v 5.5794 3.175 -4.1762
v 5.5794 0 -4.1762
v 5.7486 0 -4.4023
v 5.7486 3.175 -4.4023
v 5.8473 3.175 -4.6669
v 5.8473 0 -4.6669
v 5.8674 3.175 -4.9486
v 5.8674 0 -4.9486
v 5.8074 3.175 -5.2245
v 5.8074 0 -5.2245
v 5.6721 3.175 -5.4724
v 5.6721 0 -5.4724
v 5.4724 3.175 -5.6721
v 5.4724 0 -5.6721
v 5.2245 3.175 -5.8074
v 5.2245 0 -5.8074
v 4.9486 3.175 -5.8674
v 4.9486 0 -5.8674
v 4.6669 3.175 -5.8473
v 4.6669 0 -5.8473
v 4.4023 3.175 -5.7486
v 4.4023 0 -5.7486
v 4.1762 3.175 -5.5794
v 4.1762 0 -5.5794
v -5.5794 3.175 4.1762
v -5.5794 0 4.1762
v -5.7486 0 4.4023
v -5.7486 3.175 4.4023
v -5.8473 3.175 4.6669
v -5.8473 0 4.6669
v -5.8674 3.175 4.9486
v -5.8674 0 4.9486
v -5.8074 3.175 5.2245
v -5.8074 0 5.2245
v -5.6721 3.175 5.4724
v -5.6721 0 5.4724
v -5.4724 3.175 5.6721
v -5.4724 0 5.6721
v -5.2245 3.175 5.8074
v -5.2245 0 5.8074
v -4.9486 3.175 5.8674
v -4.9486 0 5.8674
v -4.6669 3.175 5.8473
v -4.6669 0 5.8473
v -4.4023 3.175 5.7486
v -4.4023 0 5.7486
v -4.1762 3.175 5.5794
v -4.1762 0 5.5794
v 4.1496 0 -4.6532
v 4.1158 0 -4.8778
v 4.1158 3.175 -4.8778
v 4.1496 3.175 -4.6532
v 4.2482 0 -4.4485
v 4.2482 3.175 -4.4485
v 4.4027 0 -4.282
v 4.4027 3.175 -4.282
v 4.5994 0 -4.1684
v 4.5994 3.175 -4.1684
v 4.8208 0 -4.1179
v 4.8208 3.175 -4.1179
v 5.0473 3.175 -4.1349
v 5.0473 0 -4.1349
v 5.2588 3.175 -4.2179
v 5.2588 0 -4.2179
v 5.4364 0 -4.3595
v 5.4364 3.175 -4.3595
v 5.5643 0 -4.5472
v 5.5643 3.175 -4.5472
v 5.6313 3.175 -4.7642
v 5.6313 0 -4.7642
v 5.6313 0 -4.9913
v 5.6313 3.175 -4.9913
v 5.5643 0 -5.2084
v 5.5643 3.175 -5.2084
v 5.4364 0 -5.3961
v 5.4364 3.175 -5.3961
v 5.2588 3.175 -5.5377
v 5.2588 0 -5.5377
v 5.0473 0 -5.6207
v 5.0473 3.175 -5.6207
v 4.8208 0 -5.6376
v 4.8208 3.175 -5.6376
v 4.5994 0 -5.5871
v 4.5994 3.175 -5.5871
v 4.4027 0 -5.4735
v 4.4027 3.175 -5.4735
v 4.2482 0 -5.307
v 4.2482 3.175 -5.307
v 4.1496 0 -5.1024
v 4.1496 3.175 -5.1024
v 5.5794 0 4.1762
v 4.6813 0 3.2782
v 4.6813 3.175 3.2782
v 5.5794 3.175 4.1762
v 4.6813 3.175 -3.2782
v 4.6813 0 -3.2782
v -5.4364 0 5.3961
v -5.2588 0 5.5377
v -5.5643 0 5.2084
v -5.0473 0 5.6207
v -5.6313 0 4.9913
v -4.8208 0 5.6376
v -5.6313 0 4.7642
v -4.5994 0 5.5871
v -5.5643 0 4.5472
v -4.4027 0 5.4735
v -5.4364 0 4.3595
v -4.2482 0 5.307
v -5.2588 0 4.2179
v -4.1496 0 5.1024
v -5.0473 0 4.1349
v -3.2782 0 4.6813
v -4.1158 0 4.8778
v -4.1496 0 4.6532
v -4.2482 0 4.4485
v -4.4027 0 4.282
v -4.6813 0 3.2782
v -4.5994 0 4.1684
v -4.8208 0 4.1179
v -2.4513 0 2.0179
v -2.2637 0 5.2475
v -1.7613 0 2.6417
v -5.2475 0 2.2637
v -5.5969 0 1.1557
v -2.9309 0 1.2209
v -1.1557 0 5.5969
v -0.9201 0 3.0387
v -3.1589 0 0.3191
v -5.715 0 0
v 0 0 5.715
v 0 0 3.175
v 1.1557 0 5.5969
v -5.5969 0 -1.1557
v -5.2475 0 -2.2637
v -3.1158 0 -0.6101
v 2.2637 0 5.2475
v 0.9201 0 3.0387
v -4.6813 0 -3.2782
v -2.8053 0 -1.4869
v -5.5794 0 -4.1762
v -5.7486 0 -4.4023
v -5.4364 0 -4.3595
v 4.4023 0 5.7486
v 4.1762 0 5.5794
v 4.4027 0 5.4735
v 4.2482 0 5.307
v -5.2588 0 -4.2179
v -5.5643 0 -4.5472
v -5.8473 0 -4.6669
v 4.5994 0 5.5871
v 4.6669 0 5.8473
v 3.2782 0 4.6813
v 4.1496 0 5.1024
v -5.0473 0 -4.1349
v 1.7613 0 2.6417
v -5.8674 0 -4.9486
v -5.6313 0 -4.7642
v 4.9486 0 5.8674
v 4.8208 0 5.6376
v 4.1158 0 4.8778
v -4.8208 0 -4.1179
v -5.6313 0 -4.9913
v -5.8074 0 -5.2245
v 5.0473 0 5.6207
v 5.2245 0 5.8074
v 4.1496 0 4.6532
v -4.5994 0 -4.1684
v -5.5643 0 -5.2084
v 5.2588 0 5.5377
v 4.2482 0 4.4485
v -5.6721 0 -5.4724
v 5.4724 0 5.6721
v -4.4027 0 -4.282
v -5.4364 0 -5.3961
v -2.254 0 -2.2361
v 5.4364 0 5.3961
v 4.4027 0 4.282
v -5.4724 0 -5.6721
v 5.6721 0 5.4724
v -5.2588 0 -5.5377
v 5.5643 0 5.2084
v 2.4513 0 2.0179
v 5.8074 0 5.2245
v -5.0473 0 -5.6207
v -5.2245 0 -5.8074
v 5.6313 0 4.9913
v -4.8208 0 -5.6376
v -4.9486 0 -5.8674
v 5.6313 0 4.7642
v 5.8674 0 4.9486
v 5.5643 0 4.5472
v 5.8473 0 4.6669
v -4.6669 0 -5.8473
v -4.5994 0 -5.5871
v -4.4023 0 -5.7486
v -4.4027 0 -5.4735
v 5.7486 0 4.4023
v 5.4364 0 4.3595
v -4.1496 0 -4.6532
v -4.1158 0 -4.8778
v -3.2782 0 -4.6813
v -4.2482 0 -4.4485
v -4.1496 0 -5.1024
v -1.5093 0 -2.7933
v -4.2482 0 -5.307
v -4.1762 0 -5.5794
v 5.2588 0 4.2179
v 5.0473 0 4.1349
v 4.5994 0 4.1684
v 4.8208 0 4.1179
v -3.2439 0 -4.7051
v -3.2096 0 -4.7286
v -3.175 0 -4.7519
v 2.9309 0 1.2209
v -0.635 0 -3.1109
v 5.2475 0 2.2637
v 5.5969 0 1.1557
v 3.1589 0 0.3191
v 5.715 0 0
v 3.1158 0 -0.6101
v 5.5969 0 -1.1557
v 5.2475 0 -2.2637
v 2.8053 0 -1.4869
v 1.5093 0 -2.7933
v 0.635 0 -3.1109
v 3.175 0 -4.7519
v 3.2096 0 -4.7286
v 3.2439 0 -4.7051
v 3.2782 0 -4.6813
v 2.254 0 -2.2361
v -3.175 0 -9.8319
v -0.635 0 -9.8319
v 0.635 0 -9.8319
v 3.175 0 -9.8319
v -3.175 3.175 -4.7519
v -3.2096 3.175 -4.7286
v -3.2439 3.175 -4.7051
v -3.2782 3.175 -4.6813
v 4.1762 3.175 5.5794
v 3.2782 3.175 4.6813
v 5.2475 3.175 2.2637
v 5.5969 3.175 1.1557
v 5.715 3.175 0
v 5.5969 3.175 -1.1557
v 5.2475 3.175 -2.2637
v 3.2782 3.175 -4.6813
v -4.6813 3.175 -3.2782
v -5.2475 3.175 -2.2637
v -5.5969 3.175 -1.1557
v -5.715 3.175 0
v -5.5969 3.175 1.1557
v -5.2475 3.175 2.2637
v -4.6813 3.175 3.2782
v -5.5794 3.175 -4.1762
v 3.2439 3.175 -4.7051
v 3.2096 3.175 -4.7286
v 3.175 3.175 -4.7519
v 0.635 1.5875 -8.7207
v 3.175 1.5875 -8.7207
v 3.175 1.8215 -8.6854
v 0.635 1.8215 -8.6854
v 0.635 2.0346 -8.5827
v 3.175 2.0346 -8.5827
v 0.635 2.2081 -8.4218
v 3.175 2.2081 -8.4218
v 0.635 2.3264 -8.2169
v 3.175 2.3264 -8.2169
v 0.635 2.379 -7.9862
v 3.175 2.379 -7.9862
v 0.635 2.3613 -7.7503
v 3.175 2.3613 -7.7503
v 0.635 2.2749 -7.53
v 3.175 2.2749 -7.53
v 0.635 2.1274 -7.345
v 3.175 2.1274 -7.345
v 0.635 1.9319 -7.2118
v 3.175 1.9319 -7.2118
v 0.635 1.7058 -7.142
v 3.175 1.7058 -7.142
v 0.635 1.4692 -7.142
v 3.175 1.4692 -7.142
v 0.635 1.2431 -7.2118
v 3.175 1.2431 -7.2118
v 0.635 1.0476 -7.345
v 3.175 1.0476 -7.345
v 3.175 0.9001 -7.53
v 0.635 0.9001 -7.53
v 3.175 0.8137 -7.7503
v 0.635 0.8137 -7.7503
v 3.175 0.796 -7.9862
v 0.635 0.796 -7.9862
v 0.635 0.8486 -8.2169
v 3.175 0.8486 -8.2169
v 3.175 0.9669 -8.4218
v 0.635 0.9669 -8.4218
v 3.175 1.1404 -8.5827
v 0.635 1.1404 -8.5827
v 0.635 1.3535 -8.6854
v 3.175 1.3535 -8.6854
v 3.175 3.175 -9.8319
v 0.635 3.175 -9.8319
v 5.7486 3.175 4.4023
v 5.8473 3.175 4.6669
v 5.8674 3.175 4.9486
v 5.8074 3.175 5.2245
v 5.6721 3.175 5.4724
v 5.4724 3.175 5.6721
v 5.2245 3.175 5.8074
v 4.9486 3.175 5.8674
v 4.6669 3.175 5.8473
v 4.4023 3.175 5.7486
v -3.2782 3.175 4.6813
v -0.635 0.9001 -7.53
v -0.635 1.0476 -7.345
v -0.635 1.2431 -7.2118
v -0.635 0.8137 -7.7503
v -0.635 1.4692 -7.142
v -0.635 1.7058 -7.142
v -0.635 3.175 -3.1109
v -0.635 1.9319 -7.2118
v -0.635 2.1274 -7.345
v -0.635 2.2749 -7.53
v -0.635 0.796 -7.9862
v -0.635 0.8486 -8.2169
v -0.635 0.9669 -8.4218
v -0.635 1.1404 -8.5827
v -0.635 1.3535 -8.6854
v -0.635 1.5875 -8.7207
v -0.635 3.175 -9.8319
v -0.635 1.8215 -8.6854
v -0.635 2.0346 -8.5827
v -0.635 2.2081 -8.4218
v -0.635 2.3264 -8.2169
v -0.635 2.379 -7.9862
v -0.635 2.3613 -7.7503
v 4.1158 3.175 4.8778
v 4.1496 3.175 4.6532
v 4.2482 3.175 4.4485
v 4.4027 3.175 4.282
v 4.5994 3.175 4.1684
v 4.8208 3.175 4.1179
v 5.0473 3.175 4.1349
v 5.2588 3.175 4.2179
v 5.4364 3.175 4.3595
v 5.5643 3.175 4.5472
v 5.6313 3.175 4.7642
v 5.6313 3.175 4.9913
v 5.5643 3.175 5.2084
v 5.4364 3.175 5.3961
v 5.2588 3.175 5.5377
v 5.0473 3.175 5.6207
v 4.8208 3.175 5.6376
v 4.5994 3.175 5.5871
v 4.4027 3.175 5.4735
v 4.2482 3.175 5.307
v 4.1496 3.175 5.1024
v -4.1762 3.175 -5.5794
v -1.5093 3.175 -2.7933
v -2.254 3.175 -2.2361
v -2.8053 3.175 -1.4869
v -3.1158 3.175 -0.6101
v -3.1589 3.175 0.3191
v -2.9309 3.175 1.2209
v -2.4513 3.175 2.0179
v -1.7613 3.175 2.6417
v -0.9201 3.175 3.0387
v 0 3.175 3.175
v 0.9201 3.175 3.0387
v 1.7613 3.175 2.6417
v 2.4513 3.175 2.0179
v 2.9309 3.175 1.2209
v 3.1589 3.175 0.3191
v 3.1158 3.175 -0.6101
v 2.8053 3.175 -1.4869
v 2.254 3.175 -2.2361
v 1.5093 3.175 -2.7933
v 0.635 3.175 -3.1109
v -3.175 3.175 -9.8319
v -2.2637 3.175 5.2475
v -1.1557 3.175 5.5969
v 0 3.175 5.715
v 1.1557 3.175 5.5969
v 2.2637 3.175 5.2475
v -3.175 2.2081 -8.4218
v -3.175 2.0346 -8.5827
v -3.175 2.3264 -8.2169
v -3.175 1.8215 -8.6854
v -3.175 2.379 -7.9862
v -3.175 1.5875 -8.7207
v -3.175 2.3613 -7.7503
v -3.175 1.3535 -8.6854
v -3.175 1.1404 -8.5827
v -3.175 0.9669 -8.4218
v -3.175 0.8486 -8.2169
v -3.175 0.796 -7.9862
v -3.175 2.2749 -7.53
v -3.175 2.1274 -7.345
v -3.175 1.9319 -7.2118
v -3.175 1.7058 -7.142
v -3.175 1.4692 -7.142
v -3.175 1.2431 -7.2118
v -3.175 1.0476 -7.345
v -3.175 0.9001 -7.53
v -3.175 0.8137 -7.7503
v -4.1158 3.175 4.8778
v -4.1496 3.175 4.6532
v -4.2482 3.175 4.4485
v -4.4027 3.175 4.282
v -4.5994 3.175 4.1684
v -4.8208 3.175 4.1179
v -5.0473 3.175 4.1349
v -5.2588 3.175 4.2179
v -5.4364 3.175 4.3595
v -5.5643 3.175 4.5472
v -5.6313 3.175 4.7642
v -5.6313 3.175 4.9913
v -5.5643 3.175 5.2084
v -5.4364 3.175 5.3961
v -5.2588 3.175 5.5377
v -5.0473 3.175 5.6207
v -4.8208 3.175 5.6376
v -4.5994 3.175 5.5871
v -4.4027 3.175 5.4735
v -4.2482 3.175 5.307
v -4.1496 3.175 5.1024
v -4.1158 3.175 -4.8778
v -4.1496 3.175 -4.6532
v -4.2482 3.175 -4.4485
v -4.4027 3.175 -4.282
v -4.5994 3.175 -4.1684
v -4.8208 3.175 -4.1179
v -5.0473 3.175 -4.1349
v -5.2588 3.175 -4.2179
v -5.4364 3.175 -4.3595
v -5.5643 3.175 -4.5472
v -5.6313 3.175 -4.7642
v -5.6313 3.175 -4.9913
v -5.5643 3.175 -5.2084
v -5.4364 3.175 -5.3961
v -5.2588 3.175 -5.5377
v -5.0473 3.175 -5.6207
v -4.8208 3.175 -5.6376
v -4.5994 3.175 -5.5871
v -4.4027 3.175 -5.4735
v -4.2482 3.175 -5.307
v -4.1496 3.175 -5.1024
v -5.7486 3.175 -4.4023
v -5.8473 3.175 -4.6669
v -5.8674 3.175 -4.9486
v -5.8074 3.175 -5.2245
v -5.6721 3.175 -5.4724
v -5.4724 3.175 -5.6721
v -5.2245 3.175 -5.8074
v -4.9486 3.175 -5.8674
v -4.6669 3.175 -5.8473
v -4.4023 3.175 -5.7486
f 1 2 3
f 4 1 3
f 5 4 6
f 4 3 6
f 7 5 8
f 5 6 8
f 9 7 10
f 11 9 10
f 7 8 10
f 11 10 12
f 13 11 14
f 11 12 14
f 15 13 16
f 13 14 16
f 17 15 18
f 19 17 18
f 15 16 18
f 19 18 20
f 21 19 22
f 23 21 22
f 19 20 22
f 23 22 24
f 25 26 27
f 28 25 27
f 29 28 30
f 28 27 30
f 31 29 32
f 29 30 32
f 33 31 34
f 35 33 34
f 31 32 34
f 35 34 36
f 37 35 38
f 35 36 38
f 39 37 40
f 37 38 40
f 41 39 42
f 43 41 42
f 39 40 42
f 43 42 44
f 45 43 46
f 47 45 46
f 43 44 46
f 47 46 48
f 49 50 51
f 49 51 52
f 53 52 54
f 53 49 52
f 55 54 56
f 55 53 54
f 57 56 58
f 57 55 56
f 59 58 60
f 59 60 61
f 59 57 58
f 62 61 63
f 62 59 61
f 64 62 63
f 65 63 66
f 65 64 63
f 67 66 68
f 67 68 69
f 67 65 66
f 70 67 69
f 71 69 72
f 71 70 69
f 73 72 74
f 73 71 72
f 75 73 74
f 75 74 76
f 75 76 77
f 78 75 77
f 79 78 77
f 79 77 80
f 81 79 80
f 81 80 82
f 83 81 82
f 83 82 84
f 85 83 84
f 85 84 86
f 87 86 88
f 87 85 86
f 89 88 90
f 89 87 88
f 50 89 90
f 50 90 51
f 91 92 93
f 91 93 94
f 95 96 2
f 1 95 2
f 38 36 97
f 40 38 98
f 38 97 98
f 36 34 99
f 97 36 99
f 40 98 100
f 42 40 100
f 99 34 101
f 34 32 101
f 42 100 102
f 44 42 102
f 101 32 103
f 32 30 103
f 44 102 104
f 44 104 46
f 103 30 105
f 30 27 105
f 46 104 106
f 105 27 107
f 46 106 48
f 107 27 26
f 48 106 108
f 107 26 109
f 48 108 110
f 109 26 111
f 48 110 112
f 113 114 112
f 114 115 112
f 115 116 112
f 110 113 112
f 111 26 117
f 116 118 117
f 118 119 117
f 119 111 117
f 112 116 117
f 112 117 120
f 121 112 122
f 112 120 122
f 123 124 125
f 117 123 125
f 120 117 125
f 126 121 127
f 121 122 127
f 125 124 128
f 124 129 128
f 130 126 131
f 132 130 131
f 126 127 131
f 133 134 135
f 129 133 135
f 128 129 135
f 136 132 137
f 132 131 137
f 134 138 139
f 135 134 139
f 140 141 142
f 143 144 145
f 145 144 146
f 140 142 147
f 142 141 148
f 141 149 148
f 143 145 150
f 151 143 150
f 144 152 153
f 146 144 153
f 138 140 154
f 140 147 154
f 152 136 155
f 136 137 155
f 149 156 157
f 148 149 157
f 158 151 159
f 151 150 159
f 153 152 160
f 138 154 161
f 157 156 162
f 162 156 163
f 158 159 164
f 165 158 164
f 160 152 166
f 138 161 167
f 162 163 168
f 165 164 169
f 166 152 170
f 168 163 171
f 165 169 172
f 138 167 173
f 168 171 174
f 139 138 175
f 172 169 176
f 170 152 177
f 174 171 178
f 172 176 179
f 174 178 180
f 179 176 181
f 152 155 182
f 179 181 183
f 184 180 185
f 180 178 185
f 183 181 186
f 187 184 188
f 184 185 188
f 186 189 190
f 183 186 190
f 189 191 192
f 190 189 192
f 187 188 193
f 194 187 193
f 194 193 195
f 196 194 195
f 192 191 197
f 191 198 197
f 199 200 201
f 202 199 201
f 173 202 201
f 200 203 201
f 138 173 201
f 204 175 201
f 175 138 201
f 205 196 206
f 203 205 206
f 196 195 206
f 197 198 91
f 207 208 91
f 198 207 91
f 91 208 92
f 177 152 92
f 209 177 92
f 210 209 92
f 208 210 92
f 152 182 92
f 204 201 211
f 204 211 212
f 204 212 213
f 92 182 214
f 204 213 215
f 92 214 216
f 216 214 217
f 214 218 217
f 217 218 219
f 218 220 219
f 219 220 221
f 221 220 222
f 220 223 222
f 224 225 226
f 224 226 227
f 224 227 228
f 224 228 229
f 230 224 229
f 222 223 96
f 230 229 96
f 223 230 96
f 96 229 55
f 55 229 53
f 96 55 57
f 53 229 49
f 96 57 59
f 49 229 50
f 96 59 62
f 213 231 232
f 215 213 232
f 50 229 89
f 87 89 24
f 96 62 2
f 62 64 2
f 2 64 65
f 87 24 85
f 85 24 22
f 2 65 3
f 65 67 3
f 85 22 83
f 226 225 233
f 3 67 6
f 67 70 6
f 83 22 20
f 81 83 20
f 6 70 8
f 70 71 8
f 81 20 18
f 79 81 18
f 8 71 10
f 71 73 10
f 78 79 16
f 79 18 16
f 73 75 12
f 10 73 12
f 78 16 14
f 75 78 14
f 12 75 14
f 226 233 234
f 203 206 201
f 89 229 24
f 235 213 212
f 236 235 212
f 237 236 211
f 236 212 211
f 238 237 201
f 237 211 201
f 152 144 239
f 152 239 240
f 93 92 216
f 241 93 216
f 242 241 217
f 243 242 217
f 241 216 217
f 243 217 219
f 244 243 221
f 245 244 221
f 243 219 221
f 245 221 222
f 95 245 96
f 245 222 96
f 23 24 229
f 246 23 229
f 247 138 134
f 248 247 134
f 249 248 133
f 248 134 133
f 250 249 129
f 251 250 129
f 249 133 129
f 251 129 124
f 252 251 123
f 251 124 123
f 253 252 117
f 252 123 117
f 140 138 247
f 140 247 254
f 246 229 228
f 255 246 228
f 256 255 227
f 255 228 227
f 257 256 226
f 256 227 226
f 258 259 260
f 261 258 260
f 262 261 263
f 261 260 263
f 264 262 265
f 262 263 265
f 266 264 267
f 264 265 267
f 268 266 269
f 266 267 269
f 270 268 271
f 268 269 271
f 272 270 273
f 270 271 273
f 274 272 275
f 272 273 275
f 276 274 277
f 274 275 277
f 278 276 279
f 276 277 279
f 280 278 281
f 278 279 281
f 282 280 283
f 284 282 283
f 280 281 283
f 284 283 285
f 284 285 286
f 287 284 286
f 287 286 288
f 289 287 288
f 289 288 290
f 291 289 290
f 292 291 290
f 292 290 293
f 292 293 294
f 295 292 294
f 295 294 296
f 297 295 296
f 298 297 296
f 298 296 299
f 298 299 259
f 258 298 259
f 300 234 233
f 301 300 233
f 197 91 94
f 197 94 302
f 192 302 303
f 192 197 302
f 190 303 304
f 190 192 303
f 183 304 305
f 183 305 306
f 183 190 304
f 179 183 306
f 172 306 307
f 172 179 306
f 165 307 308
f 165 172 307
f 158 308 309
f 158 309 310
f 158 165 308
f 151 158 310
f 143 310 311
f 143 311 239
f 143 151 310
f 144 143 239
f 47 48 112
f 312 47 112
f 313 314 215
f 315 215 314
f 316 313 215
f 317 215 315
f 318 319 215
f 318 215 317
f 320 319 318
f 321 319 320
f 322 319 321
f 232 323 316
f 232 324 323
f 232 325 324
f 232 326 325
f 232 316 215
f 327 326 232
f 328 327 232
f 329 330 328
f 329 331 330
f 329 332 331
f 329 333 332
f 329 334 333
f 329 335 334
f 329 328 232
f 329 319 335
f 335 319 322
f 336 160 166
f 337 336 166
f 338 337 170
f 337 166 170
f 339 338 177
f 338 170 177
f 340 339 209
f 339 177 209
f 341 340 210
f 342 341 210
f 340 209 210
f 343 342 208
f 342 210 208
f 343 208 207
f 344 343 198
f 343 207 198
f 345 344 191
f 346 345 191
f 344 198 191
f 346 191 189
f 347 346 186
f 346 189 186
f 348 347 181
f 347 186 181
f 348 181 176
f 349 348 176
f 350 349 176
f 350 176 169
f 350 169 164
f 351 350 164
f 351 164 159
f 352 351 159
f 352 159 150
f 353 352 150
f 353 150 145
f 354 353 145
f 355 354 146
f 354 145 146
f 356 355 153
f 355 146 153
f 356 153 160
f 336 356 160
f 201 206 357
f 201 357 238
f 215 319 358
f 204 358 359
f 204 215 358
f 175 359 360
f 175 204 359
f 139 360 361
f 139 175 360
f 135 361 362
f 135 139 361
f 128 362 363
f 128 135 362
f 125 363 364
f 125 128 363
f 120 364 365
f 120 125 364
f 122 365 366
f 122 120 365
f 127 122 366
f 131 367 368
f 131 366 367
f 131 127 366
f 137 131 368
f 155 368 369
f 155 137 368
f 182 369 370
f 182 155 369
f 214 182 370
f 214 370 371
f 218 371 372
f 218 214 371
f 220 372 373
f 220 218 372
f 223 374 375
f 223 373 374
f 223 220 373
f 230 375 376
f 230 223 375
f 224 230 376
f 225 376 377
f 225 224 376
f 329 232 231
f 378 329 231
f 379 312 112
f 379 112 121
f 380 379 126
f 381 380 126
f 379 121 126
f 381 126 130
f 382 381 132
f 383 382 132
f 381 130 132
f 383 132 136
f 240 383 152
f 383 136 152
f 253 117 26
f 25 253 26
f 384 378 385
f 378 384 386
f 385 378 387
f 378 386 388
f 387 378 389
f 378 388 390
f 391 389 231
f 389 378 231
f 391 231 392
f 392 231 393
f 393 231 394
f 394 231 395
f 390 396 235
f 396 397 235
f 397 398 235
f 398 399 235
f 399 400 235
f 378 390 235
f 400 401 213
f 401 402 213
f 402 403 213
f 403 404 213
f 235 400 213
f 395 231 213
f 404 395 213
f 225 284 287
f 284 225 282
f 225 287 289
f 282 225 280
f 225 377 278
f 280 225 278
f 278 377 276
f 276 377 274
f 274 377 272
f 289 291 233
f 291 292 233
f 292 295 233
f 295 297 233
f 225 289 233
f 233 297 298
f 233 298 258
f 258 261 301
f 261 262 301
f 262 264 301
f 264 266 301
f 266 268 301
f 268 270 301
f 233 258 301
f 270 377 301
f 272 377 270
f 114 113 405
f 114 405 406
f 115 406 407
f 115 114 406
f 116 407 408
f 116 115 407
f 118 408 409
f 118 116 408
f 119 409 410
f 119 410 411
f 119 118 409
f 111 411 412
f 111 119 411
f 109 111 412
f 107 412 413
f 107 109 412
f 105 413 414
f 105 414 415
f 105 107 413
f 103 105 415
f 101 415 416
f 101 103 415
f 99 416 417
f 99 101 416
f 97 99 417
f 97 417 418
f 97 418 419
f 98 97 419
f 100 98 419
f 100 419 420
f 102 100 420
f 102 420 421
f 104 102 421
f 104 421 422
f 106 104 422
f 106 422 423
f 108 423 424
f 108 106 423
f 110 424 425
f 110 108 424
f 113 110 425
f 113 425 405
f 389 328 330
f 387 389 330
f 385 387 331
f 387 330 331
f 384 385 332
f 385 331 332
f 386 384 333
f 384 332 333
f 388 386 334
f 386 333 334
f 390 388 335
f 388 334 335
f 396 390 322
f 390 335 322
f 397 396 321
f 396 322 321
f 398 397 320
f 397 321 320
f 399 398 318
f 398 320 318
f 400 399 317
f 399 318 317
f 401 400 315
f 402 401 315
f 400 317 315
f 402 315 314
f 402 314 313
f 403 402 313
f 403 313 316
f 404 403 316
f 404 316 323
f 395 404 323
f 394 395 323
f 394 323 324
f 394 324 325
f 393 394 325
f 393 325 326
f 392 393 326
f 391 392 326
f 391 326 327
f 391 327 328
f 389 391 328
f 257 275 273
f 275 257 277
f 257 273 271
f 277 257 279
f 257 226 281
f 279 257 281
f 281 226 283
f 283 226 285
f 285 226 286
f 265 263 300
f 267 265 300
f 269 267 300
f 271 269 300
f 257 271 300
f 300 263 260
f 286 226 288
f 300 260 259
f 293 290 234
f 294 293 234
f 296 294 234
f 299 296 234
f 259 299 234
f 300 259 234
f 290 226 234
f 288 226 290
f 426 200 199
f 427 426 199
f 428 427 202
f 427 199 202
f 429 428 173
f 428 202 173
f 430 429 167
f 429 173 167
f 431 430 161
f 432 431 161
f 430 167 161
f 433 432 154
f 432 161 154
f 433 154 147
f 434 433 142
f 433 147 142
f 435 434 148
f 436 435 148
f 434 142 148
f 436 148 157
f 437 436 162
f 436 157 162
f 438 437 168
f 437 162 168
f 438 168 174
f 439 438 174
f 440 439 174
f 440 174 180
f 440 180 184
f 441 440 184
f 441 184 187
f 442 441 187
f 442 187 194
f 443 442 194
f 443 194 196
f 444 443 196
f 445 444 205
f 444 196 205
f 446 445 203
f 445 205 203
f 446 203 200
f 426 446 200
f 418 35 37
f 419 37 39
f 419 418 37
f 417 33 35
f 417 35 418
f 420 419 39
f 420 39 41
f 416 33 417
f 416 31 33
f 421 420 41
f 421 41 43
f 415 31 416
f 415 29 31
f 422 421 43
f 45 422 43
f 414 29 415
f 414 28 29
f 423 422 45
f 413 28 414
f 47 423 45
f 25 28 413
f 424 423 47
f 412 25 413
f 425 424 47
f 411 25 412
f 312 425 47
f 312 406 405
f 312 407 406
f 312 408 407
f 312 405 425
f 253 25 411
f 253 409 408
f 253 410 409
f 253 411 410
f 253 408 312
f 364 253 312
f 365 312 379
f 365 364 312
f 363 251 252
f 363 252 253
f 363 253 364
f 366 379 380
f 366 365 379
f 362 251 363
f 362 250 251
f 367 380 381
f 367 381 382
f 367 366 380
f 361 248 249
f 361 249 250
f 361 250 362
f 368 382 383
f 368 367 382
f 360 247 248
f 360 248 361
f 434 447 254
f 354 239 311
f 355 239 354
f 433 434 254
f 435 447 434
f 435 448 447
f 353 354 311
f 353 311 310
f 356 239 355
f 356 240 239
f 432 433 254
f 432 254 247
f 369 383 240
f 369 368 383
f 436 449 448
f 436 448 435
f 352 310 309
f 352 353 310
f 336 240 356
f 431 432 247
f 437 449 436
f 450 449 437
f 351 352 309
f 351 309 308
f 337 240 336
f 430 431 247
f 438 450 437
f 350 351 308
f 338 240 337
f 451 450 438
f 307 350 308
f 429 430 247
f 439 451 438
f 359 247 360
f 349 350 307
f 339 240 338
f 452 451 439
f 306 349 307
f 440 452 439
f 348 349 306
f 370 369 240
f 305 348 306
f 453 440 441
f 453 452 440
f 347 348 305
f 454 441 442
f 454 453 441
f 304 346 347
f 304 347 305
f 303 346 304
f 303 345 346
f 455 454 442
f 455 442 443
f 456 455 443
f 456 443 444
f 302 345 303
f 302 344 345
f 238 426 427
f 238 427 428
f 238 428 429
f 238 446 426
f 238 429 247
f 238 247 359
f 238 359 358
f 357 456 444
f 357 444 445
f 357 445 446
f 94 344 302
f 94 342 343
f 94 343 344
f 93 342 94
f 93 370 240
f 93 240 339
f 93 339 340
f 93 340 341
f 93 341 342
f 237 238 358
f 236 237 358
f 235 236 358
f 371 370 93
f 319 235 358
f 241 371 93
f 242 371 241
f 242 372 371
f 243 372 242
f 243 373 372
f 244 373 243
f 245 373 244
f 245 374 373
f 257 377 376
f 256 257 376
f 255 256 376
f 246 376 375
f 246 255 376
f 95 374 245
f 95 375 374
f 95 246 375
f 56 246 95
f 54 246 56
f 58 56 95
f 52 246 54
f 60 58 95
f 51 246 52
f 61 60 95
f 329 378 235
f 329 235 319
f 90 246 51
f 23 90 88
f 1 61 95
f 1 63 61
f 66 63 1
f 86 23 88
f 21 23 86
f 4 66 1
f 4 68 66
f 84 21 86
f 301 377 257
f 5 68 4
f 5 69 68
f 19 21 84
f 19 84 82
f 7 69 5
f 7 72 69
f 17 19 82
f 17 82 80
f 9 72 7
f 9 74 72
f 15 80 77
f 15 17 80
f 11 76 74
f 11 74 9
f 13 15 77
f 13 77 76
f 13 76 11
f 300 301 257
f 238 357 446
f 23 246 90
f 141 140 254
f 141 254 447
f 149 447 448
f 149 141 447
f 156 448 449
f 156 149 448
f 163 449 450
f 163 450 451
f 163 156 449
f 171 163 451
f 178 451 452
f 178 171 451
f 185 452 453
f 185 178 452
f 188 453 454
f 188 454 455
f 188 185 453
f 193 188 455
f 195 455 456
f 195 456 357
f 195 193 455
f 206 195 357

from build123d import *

# Parameters (mm, degrees)
SKETCH1_R                                  = 3.175
BOSS_EXTRUDE1_DEPTH                        = 3.175
SKETCH3_W                                  = 1.27
SKETCH3_H                                  = 6.721052908
CUT_EXTRUDE1_DEPTH                         = 3.175
SKETCH4_R                                  = 0.79375
CUT_EXTRUDE2_DEPTH                         = 9.89
SKETCH5_R                                  = 0.762
BOSS_EXTRUDE2_DEPTH                        = 3.175
MIRROR1_AT_THE_SECOND_PLANE_COPY_1_SKETC_R = 0.762
MIRROR1_AT_THE_SECOND_PLANE_COPY_1_DEPTH   = 3.175


with BuildPart() as part:
    # Sketch1 → Boss-Extrude1 (new body)
    with BuildSketch(Plane(origin=(0, 0, 0), x_dir=(1, 0, 0), z_dir=(0, 1, 0))):
        with BuildLine():
            Line((3.175, 4.751904881), (3.175, 9.831904881))
            Line((3.175, 9.831904881), (-3.175, 9.831904881))
            Line((-3.175, 9.831904881), (-3.175, 4.751904881))
            ThreePointArc((-3.175, 4.751904881), (0, -5.715), (3.175, 4.751904881))
        make_face()
        Circle(SKETCH1_R, mode=Mode.SUBTRACT)
    extrude(amount=BOSS_EXTRUDE1_DEPTH)

    # Sketch3 → Cut-Extrude1 (cut)
    with BuildSketch(Plane(origin=(0, 3.175, 0), x_dir=(1, 0, 0), z_dir=(0, 1, 0))):
        with Locations((0, 6.471378427)):
            Rectangle(SKETCH3_W, SKETCH3_H)
    extrude(amount=-CUT_EXTRUDE1_DEPTH, mode=Mode.SUBTRACT)

    # Sketch4 → Cut-Extrude2 (cut, through all)
    with BuildSketch(Plane(origin=(3.175, 0, 0), x_dir=(0, 0, -1), z_dir=(1, 0, 0))):
        with Locations((7.926904881, 1.5875)):
            Circle(SKETCH4_R)
    extrude(amount=-CUT_EXTRUDE2_DEPTH, mode=Mode.SUBTRACT)

    # Sketch5 → Boss-Extrude2 (add)
    with BuildSketch(Plane.XZ):
        with BuildLine():
            Line((-4.176191145, -5.579356164), (-3.278165533, -4.681330552))
            ThreePointArc((-3.278165533, -4.681330552), (-4.041115254, -4.041115254), (-4.681330552, -3.278165533))
            Line((-4.681330552, -3.278165533), (-5.579356164, -4.176191145))
            ThreePointArc((-5.579356164, -4.176191145), (-5.579356164, -5.579356164), (-4.176191145, -5.579356164))
        make_face()
        with Locations((-4.877773655, -4.877773655)):
            Circle(SKETCH5_R, mode=Mode.SUBTRACT)
    boss_extrude2 = extrude(amount=-BOSS_EXTRUDE2_DEPTH)

    # Mirror1: Boss-Extrude2 across plane
    add(boss_extrude2.mirror(Plane(origin=(0, 0, 0), x_dir=(0, 0, 1), z_dir=(1, 0, 0))))

    # Mirror1 at the second plane: Boss-Extrude2 across plane
    add(boss_extrude2.mirror(Plane.XY))

    # Mirror1 at the second plane copy 1 sketc → Mirror1 at the second plane copy 1 (add)
    with BuildSketch(Plane(origin=(0, 0, 0), x_dir=(-1, 0, 0), z_dir=(0, -1, 0))):
        with BuildLine():
            Line((-4.176191145, -5.579356164), (-3.278165533, -4.681330552))
            ThreePointArc((-3.278165533, -4.681330552), (-4.041115254, -4.041115254), (-4.681330552, -3.278165533))
            Line((-4.681330552, -3.278165533), (-5.579356164, -4.176191145))
            ThreePointArc((-5.579356164, -4.176191145), (-5.579356164, -5.579356164), (-4.176191145, -5.579356164))
        make_face()
        with Locations((-4.877773655, -4.877773655)):
            Circle(MIRROR1_AT_THE_SECOND_PLANE_COPY_1_SKETC_R, mode=Mode.SUBTRACT)
    extrude(amount=-MIRROR1_AT_THE_SECOND_PLANE_COPY_1_DEPTH)


solid = part.part
